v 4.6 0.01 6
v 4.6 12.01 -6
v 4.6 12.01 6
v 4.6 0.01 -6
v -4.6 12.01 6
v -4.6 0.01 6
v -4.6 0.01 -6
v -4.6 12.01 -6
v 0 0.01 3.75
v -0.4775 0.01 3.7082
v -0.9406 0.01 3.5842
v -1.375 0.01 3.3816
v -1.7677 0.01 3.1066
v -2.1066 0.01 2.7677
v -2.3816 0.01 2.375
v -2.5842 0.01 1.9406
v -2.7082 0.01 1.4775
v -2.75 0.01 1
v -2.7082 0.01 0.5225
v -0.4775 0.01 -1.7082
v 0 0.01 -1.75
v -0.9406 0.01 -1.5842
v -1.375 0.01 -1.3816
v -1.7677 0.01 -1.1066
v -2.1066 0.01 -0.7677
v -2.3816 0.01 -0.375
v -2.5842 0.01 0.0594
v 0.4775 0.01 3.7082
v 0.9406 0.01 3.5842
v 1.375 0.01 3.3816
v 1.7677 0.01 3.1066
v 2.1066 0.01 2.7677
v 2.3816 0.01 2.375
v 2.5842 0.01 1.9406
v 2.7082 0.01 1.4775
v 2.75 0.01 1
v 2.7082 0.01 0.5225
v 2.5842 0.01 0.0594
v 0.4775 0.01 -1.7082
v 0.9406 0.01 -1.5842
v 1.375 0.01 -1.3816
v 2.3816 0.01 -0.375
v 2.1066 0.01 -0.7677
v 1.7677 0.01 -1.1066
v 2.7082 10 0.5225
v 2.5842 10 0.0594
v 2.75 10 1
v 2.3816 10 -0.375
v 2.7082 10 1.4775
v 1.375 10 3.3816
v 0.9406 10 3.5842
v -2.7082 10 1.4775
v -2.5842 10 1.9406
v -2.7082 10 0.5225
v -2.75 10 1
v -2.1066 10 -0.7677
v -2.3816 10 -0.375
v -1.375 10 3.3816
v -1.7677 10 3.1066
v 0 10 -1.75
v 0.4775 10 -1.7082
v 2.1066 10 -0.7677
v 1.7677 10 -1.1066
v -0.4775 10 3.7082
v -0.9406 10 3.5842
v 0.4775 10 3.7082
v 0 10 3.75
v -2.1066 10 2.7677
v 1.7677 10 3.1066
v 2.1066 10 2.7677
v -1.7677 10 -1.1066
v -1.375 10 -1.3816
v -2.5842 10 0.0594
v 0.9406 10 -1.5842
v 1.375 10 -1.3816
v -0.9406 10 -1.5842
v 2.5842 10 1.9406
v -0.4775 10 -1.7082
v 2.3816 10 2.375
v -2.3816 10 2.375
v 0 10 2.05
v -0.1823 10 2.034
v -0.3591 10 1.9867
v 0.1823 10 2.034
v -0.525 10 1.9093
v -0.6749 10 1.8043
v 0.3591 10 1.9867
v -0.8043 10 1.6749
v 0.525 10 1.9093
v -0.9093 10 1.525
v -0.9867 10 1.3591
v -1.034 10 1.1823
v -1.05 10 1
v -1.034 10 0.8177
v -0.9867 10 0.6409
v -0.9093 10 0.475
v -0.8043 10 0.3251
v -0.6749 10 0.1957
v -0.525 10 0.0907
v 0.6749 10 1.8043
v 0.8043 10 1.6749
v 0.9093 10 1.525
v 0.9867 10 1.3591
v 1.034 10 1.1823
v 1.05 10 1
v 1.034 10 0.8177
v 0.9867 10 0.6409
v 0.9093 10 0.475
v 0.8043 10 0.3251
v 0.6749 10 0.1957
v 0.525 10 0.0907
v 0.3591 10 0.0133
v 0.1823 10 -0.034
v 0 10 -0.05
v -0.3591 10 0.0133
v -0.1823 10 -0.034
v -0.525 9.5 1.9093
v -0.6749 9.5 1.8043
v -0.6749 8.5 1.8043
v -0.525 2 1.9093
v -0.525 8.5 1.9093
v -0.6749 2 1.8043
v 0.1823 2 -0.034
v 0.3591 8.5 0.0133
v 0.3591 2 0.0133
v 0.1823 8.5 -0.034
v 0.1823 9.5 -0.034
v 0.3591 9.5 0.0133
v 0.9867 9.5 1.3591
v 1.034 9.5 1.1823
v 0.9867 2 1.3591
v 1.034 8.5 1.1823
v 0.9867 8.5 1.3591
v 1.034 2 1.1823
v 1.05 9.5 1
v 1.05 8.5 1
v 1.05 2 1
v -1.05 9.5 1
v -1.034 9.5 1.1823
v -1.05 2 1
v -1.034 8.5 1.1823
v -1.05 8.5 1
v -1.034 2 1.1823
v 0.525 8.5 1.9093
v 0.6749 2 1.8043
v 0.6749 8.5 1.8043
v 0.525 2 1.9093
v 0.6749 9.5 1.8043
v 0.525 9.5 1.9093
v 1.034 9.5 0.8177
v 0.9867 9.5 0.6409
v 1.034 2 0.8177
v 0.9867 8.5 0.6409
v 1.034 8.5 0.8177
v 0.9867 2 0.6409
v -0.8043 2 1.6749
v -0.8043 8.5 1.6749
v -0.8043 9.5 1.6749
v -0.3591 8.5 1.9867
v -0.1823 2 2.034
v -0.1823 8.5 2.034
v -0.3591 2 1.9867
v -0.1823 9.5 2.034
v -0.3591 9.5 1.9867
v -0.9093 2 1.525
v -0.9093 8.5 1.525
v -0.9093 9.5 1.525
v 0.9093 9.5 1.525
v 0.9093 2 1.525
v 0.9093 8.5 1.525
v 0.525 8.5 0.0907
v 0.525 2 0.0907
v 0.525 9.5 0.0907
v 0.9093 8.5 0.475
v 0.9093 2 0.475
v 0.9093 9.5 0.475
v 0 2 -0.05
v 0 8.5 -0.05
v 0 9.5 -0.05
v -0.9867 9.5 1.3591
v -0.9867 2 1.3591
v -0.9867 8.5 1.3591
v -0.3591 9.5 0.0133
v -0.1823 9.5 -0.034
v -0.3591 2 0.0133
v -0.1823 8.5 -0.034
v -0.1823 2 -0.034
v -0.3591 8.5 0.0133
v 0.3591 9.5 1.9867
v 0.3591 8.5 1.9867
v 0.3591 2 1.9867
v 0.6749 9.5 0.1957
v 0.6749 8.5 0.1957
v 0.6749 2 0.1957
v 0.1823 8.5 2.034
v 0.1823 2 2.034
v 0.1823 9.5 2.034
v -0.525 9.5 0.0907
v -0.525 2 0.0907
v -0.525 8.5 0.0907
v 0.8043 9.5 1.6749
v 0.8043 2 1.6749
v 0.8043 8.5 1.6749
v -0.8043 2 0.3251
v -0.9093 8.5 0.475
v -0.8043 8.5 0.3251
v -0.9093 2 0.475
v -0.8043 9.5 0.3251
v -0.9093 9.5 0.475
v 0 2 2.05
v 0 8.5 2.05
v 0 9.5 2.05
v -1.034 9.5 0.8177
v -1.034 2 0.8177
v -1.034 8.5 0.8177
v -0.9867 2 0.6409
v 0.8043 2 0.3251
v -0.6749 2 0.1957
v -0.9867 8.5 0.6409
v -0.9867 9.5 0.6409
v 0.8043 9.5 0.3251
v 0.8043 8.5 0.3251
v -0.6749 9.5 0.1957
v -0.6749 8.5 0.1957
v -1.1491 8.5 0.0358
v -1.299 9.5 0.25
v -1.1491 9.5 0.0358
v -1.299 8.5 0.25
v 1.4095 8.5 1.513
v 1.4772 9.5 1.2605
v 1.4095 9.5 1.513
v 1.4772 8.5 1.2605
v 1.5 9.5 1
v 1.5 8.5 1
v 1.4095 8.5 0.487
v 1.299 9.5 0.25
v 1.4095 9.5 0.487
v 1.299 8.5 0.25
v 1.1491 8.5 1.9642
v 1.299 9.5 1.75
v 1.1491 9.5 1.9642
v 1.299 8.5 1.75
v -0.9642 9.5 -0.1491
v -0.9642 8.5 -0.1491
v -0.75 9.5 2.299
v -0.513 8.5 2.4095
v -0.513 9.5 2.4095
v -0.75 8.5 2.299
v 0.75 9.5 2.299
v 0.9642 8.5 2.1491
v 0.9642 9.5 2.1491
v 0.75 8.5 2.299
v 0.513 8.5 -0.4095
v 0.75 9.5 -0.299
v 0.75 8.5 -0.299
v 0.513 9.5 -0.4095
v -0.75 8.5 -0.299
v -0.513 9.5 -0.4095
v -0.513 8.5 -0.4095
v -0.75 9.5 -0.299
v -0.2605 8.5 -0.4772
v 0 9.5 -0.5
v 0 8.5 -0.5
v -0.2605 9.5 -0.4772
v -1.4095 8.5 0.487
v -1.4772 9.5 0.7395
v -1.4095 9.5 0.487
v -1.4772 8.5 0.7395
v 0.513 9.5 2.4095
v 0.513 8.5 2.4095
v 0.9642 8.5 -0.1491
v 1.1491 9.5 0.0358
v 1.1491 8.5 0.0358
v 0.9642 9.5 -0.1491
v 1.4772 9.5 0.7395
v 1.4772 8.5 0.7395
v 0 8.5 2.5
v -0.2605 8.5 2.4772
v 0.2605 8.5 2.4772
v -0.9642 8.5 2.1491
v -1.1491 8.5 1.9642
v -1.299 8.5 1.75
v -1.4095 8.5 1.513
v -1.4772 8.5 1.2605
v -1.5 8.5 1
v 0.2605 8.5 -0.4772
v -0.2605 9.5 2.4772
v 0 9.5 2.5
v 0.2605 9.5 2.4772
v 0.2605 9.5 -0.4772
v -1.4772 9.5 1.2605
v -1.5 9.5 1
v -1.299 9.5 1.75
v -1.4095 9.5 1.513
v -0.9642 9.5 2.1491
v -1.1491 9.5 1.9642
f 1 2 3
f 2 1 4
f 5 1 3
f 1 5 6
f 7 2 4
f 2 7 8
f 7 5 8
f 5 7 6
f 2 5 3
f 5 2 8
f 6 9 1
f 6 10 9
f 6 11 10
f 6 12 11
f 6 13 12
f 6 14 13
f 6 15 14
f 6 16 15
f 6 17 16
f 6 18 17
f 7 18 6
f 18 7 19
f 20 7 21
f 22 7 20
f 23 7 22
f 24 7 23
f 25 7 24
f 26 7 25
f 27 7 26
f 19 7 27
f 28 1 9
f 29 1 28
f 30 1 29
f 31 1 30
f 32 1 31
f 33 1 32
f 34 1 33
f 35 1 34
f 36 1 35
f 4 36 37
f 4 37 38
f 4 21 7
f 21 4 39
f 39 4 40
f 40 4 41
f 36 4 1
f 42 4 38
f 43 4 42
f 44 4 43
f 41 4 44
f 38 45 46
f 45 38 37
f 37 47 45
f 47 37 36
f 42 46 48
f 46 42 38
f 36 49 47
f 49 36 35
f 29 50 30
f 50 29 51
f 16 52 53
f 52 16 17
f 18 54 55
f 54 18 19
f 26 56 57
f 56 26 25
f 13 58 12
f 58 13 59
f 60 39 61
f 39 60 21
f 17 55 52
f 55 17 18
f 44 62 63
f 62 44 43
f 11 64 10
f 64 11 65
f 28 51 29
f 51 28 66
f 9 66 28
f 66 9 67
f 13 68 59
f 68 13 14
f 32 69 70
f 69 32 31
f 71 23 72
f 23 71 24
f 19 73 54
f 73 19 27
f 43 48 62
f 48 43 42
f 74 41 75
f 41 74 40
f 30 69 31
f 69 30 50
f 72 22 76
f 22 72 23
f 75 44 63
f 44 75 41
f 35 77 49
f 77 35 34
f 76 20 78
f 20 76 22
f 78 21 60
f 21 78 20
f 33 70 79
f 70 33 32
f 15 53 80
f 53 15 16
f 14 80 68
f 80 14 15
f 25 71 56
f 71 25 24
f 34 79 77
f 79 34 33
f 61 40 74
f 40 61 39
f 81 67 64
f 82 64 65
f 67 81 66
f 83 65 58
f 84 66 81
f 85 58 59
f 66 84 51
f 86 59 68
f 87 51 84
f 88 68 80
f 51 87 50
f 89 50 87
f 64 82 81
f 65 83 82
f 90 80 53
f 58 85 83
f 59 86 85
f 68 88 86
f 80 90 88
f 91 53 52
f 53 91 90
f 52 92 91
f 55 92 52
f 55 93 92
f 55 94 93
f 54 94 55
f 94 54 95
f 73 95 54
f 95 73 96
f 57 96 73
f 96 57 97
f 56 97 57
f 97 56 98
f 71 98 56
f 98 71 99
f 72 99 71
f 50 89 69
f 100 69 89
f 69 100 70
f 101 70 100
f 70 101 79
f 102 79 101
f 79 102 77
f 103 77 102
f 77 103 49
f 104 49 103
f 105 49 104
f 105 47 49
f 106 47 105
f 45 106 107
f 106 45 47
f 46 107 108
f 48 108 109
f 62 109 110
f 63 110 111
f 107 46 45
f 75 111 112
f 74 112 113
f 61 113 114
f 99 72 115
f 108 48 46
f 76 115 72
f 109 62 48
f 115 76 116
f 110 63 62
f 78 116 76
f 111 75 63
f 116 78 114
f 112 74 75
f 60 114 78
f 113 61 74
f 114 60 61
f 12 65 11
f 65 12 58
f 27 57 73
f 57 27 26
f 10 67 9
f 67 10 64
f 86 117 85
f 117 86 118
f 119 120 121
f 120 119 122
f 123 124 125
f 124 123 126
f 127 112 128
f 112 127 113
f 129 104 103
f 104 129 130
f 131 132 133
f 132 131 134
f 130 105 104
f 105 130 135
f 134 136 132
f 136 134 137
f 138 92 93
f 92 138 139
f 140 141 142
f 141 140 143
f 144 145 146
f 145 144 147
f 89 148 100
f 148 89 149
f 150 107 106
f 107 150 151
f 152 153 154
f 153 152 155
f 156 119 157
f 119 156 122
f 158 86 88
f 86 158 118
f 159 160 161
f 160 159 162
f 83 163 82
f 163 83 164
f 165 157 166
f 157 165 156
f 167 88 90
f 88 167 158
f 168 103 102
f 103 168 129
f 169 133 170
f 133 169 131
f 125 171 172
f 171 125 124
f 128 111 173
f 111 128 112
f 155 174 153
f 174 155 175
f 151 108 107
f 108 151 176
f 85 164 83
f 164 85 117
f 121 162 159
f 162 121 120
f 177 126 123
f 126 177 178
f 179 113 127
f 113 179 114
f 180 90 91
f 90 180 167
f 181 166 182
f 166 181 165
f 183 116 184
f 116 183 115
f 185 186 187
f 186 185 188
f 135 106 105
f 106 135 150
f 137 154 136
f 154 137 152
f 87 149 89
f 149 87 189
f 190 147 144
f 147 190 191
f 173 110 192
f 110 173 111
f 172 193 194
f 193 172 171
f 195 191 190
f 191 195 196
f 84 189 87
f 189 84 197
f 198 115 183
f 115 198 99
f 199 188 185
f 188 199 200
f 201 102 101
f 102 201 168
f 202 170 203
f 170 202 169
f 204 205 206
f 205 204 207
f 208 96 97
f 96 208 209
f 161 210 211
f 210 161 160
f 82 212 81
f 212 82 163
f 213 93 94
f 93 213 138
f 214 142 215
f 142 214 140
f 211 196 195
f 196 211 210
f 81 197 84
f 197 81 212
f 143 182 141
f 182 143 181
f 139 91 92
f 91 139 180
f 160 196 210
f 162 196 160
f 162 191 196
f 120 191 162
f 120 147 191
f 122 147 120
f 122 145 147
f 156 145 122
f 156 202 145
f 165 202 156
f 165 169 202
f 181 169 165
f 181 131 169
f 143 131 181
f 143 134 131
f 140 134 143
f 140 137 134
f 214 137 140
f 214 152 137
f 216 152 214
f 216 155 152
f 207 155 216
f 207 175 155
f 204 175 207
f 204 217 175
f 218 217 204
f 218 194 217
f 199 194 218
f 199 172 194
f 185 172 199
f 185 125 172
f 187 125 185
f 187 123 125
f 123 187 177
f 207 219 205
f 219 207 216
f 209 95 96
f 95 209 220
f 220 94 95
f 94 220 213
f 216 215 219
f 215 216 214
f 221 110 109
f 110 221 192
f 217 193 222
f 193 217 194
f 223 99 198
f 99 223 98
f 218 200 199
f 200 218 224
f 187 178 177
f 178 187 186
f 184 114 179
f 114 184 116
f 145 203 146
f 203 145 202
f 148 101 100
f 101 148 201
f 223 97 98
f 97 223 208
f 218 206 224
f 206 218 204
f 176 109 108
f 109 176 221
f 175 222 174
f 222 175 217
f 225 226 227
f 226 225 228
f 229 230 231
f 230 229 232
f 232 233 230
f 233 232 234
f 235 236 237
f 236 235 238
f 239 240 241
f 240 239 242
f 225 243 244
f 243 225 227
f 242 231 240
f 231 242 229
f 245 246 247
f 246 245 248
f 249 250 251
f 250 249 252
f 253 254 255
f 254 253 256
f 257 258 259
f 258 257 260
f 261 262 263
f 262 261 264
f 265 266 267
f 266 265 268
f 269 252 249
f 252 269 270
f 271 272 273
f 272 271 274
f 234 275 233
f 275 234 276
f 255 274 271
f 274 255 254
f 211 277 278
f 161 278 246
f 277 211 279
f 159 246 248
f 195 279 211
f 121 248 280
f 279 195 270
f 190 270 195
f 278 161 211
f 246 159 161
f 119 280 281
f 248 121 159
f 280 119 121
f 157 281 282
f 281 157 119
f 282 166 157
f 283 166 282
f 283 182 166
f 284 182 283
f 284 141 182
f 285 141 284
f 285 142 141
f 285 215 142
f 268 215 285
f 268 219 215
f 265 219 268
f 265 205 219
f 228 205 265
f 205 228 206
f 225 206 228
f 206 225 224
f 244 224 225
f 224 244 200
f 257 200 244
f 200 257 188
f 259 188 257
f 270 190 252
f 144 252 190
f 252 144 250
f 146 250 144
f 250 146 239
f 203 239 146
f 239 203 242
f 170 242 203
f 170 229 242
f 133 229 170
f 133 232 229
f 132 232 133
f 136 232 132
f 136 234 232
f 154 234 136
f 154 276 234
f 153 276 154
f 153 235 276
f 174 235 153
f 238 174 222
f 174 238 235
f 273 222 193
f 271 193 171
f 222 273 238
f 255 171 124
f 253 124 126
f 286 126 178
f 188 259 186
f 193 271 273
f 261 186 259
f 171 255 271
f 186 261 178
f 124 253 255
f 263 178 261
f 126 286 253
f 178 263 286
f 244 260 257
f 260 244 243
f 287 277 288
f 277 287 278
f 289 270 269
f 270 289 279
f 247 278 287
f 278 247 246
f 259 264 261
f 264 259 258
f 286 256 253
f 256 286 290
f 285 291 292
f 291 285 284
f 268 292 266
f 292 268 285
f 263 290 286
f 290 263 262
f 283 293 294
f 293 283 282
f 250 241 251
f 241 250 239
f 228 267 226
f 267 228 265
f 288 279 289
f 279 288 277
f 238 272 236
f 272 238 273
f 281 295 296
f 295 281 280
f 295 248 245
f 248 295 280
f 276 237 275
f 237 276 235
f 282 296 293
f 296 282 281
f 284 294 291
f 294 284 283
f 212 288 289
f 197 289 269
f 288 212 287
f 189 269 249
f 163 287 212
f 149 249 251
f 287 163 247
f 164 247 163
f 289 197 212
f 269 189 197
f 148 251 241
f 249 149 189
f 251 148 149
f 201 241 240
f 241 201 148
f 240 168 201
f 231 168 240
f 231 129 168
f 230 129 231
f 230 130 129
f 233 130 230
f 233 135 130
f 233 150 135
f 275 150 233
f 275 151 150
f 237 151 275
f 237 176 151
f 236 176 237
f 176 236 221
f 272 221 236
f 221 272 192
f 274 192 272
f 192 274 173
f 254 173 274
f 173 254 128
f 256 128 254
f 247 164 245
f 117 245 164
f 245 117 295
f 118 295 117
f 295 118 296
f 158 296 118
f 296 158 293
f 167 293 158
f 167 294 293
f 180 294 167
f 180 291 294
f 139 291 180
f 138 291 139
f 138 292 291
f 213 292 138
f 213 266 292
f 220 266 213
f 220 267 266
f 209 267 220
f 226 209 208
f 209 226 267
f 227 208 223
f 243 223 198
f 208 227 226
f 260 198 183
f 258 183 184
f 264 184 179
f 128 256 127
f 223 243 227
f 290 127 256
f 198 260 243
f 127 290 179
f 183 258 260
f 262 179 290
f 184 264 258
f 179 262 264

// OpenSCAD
BarrelJack();  // TODO-inprogress

$fn=36;
EPS=0.01;

// TODO: remove following variables/offsets
po1=-4.7;
po2=1;
po3=-5.8;
po4=1.3;

module TriggerTerminal() {
    Width=6.5;
    Height=9.0;
    Depth=12.0;
    HeightHole=5.8;
    DepthHole=10.0;
    DiamHole=5.4;
    DepthPin=8.0;
    DiamPin=1.3;
    translate([Width/2, 0, 0]) union() {
        difference() {
            translate([-Width/2, EPS, 0]) color("black", 1.0) cube([Width, Depth, Height]);
            translate([0, 0, HeightHole]) rotate([-90, 0, 0]) color("dimgray", 1.0) cylinder(h=DepthHole, d=DiamHole, center=false);
        }
        translate([0, DepthHole, HeightHole]) rotate([90, 0, 0]) color("silver", 1.0) cylinder(h=DepthPin, d=DiamPin, center=false);
    }
}

module EthPort() {
    Width1=16.3; Depth1=15.6; Height1=13.1;  // Metal housing
    Width2=14.3; Depth2=15.0; Height2=11.1;  // Composite
    O2=1.0;  // Ethernet Plug Opening Offset
    EW1=11.9; ED1=10.0; EH1=6.9;  // Ethernet Plug Bottom
    EW2=6.4;  ED2=6.0;  EH2=1.7;  // Ethernet Plug Top
    EW3=4.1;  ED3=5.0;  EH3=1.3;  // Ethernet Plug Clip
    LEDW=1.5; LEDH=2.3;  // LED
    LEDOX=5; LEDOH=8.5;  // Offsets

    O1=(Height1-Height2)/2;  // Generated Offset
    translate([Width1/2, 0, 0]) union() {
        difference() {
            union() {
                translate([-Width1/2, 2*EPS, 0]) color("silver", 1.0) cube([Width1, Depth1, Height1]);
                translate([-Width2/2, EPS, O1]) color("#202423") cube([Width2, Depth2, Height2]);
            }
            translate([-EW1/2, 0, O1+O2]) color("dimgray", 1.0) cube([EW1, ED1, EH1+EPS]);
            translate([-EW2/2, 0, O1+O2+EH1]) color("dimgray", 1.0) cube([EW2, ED2, EH2+EPS]);
            translate([-EW3/2, 0, O1+O2+EH1+EH2]) color("dimgray", 1.0) cube([EW3, ED3, EH3]);
        }
        translate([-LEDOX, 0.7, O1+O2+LEDOH]) color("darkgoldenrod", 1.0) cube([LEDW,1.5,LEDH], $fn=30, center=true);
        translate([+LEDOX, 0.7, O1+O2+LEDOH]) color("green", 1.0) cube([LEDW,1.5,LEDH], center=true);
    }
}

module BarrelJack() {
    // TODO: borrow from TriggerTerminal()
    union() {
        difference() {
            translate([-9.2/2, EPS, -12/2]) color("black", 1.0) cube([9.2, 12, 12]);
            translate([0, 0, po2]) rotate([-90, 0, 0]) color("dimgray", 1.0) cylinder(h=10, d=5.5, center=false);
        }
        translate([0, 10, po2]) rotate([90, 0, 0]) color("silver", 1.0) cylinder(h=8, d=2.1, center=false);
        translate([0, 9.5, po2]) rotate([90, 0, 0]) color("silver", 1.0) cylinder(h=1, d=3, center=false);
    }
}

module USB30TypeBPinPair() {
    // TODO: define dims
    // TODO: align with center axis
    color("goldenrod") translate([-1.25, 2, po3+5.13]) rotate([90, 0, 90]) linear_extrude(height = 0.65, center=true) {
        polygon([[0,-0.05],[0,0],[0.8,0],[1.0,0.05],[1.4,0.30],[1.7,0.38],[2.3,0.38],[2.8,0.32],[4.5,0.05],[6,0.0],[6,-0.05],[1,-0.05]]);
    }
    color("goldenrod") translate([-1.25, 2, po3+1.95]) rotate([-90, 0, 90]) linear_extrude(height = 0.65, center=true) {
        polygon([[0,-0.05],[0,0],[0.8,0],[1.0,0.05],[1.4,0.30],[1.7,0.38],[2.3,0.38],[2.8,0.32],[4.5,0.05],[6,0.0],[6,-0.05],[1,-0.05]]);
    }
}

module USB30TypeB() {
    // TODO: define dims
    // TODO: align with center axis
    union() {
        difference() {
            translate([-12.4/2, 2*EPS, -14.1/2]) color("silver", 1.0) cube([12.4, 18.4, 14.1]);
            color("royalblue") hull() {
                translate([-8.45/2, 0, po3]) cube([8.45, 9.00, 6.31+EPS]);
                translate([-6.59/2, 0, po3+6.31]) cube([6.59, 9.00, 0.93+EPS]);
            }
            color("royalblue") translate([-6.59/2, 0, po3+7.24]) cube([6.59, 9.00, 3.56]);
        }
        color("royalblue") hull() {
            translate([-4.6/2, 0.62, po3+2.45]) cube([4.6, 8.38, 2.18+EPS]);
            translate([-5.6/2, 1.68, po3+1.95]) cube([5.6, 7.38, 3.18+EPS]);
        }
        color("royalblue") minkowski() {
            sphere(d=0.6, $fn=6);
            translate([-5.0/2, 1.30, po3+8.64]) cube([5.0, 8.00, 1.01]);
        }
        USB30TypeBPinPair();
        mirror([1, 0, 0]) USB30TypeBPinPair();
    }
}

module _DSubPin(x, z) {
    color("gold", 1.0) hull() {
        translate([x, 0.2, z]) rotate([-90, 0, 0]) cylinder(h=5.5, d=0.64);
        translate([x, 0.2, z]) rotate([-90, 0, 0]) cylinder(h=5.0, d=1);
    }
}

module _DSubHole(x, z) {
    translate([x, -EPS, z]) rotate([-90, 0, 0]) color("gold", 1.0) cylinder(h=5.5, d=1.02);
}

module _DSub25Outer() {
    hull($fn=60) {
        translate([-38.96/2+2.64, 0, 8.36/2-2.64]) rotate([-90, 0, 0]) cylinder(h=5.9, r=2.64);
        translate([38.96/2-2.64, 0, 8.36/2-2.64]) rotate([-90, 0, 0]) cylinder(h=5.9, r=2.64);
        translate([38.96/2-2.64-1.01, 0, -8.36/2+2.64]) rotate([-90, 0, 0]) cylinder(h=5.9, r=2.64);
        translate([-38.96/2+2.64+1.01, 0, -8.36/2+2.64]) rotate([-90, 0, 0]) cylinder(h=5.9, r=2.64);
    }
}

module _DSub25Inner() {
    hull($fn=60) {
        translate([-38.96/2+2.64, EPS, 8.36/2-2.64]) rotate([-90, 0, 0]) cylinder(h=5.9, r=1.96);
        translate([38.96/2-2.64, EPS, 8.36/2-2.64]) rotate([-90, 0, 0]) cylinder(h=5.9, r=1.96);
        translate([38.96/2-2.64-1.01, EPS, -8.36/2+2.64]) rotate([-90, 0, 0]) cylinder(h=5.9, r=1.96);
        translate([-38.96/2+2.64+1.01, EPS, -8.36/2+2.64]) rotate([-90, 0, 0]) cylinder(h=5.9, r=1.96);
    }
}

module DSub25Pins() {
    // TODO: define dims
    // TODO: align with center axis
    difference() {
        color("silver", 1.0) _DSub25Outer();
        color("white", 1.0) _DSub25Inner();
    }
    for(xi=[-6.0:6.0])  { _DSubPin(xi*2.77, 2.77/2); }
    for(xi=[-5.5:5.5])  { _DSubPin(xi*2.77, -2.77/2); }
}

module DSub25Socket() {
    // TODO: define dims
    // TODO: align with center axis
    difference() {
        color("white", 1.0) _DSub25Outer();
        for(xi=[-6.0:6.0])  { _DSubHole(xi*2.77, 2.77/2); }
        for(xi=[-5.5:5.5])  { _DSubHole(xi*2.77, -2.77/2); }
    }
}

module PowerDebugBlock() {
    // TODO: define dims
    // TODO: align with center axis
    difference() {
        m=1.2;  // Housing fillet diameter
        color("linen", 1.0) translate([m/2, m/2, m/2]) minkowski() {
            sphere(d=m, $fn=18);
            cube([176.5-m, 78.4-m, 21.3-m]);
        }
        color("linen", 1.0) {
            translate([3, 3, 0]) cube([176.5-2*3, 78.4-2*3, 0.4]);
            translate([3, 3, 21.3-0.4]) cube([176.5-2*3, 78.4-2*3, 0.4]);
        }
        color("#425232") translate([3, 3, 2]) cube([170.5, 72.4, 17.3]);
        translate([78.2, 39.22, 19.2]) cylinder(h=2.2, d=39.5);
    }
}

module HeatSink() {
    // TODO: define dims
    // TODO: align with center axis
    color("#202423") difference() {
        hull() {
            cube([76.2, 51.84, 4.4]);
            translate([3,0,0]) cube([70.2, 51.84, 7.4]);
        }
        for(fin=[1.44:3.60:51.2]) {
            translate([-EPS, fin, 3.4]) cube([76.2+2*EPS, 2.16, 4+EPS]);
        }
        translate([34, 51.84/2, -EPS]) cylinder(h=4, d=40.5);
    }
}

module PodBusExpressOut() {
    // TODO: define dims
    // TODO: align with center axis
    // TODO: fix indenting
    color("#202423", 1.0) union() {
        difference() {
            cube([54.2, 5, 8.4]);
            hull() {
                translate([6.47, -EPS, 2.04]) cube([41.26, 4.28, 5.72]);
                translate([7.87, -EPS, 0.64]) cube([38.46, 4.28, 2.5]);
            }
        }
        translate([2.63+6.47, -EPS, 4.2-1.6]) cube([16, 4.1, 1.4]);
        translate([2.63+6.47, -EPS, 4.2+0.4]) cube([16, 4.1, 1.4]);
        translate([22.63+6.47, -EPS, 4.2-1.6]) cube([16, 4.1, 1.4]);
        translate([22.63+6.47, -EPS, 4.2+0.4]) cube([16, 4.1, 1.4]);
    }
    for(x=[0:1]) {
    for(y=[0:1]) {
    translate([2.63+6.47+0.75+20*x, 0.5, 4.2+0.4+1.4-3.4*y]) rotate([-90, 0, 0])
    for(pin=[0:0.5:14.9]) {
        color("darkgoldenrod") translate([pin, 0, 0]) cylinder(h=4, d=0.26);
    }}}
}

module PodBusExpressIn() {
    // TODO: create definition
    // TODO: define dims
    // TODO: align with center axis
}
